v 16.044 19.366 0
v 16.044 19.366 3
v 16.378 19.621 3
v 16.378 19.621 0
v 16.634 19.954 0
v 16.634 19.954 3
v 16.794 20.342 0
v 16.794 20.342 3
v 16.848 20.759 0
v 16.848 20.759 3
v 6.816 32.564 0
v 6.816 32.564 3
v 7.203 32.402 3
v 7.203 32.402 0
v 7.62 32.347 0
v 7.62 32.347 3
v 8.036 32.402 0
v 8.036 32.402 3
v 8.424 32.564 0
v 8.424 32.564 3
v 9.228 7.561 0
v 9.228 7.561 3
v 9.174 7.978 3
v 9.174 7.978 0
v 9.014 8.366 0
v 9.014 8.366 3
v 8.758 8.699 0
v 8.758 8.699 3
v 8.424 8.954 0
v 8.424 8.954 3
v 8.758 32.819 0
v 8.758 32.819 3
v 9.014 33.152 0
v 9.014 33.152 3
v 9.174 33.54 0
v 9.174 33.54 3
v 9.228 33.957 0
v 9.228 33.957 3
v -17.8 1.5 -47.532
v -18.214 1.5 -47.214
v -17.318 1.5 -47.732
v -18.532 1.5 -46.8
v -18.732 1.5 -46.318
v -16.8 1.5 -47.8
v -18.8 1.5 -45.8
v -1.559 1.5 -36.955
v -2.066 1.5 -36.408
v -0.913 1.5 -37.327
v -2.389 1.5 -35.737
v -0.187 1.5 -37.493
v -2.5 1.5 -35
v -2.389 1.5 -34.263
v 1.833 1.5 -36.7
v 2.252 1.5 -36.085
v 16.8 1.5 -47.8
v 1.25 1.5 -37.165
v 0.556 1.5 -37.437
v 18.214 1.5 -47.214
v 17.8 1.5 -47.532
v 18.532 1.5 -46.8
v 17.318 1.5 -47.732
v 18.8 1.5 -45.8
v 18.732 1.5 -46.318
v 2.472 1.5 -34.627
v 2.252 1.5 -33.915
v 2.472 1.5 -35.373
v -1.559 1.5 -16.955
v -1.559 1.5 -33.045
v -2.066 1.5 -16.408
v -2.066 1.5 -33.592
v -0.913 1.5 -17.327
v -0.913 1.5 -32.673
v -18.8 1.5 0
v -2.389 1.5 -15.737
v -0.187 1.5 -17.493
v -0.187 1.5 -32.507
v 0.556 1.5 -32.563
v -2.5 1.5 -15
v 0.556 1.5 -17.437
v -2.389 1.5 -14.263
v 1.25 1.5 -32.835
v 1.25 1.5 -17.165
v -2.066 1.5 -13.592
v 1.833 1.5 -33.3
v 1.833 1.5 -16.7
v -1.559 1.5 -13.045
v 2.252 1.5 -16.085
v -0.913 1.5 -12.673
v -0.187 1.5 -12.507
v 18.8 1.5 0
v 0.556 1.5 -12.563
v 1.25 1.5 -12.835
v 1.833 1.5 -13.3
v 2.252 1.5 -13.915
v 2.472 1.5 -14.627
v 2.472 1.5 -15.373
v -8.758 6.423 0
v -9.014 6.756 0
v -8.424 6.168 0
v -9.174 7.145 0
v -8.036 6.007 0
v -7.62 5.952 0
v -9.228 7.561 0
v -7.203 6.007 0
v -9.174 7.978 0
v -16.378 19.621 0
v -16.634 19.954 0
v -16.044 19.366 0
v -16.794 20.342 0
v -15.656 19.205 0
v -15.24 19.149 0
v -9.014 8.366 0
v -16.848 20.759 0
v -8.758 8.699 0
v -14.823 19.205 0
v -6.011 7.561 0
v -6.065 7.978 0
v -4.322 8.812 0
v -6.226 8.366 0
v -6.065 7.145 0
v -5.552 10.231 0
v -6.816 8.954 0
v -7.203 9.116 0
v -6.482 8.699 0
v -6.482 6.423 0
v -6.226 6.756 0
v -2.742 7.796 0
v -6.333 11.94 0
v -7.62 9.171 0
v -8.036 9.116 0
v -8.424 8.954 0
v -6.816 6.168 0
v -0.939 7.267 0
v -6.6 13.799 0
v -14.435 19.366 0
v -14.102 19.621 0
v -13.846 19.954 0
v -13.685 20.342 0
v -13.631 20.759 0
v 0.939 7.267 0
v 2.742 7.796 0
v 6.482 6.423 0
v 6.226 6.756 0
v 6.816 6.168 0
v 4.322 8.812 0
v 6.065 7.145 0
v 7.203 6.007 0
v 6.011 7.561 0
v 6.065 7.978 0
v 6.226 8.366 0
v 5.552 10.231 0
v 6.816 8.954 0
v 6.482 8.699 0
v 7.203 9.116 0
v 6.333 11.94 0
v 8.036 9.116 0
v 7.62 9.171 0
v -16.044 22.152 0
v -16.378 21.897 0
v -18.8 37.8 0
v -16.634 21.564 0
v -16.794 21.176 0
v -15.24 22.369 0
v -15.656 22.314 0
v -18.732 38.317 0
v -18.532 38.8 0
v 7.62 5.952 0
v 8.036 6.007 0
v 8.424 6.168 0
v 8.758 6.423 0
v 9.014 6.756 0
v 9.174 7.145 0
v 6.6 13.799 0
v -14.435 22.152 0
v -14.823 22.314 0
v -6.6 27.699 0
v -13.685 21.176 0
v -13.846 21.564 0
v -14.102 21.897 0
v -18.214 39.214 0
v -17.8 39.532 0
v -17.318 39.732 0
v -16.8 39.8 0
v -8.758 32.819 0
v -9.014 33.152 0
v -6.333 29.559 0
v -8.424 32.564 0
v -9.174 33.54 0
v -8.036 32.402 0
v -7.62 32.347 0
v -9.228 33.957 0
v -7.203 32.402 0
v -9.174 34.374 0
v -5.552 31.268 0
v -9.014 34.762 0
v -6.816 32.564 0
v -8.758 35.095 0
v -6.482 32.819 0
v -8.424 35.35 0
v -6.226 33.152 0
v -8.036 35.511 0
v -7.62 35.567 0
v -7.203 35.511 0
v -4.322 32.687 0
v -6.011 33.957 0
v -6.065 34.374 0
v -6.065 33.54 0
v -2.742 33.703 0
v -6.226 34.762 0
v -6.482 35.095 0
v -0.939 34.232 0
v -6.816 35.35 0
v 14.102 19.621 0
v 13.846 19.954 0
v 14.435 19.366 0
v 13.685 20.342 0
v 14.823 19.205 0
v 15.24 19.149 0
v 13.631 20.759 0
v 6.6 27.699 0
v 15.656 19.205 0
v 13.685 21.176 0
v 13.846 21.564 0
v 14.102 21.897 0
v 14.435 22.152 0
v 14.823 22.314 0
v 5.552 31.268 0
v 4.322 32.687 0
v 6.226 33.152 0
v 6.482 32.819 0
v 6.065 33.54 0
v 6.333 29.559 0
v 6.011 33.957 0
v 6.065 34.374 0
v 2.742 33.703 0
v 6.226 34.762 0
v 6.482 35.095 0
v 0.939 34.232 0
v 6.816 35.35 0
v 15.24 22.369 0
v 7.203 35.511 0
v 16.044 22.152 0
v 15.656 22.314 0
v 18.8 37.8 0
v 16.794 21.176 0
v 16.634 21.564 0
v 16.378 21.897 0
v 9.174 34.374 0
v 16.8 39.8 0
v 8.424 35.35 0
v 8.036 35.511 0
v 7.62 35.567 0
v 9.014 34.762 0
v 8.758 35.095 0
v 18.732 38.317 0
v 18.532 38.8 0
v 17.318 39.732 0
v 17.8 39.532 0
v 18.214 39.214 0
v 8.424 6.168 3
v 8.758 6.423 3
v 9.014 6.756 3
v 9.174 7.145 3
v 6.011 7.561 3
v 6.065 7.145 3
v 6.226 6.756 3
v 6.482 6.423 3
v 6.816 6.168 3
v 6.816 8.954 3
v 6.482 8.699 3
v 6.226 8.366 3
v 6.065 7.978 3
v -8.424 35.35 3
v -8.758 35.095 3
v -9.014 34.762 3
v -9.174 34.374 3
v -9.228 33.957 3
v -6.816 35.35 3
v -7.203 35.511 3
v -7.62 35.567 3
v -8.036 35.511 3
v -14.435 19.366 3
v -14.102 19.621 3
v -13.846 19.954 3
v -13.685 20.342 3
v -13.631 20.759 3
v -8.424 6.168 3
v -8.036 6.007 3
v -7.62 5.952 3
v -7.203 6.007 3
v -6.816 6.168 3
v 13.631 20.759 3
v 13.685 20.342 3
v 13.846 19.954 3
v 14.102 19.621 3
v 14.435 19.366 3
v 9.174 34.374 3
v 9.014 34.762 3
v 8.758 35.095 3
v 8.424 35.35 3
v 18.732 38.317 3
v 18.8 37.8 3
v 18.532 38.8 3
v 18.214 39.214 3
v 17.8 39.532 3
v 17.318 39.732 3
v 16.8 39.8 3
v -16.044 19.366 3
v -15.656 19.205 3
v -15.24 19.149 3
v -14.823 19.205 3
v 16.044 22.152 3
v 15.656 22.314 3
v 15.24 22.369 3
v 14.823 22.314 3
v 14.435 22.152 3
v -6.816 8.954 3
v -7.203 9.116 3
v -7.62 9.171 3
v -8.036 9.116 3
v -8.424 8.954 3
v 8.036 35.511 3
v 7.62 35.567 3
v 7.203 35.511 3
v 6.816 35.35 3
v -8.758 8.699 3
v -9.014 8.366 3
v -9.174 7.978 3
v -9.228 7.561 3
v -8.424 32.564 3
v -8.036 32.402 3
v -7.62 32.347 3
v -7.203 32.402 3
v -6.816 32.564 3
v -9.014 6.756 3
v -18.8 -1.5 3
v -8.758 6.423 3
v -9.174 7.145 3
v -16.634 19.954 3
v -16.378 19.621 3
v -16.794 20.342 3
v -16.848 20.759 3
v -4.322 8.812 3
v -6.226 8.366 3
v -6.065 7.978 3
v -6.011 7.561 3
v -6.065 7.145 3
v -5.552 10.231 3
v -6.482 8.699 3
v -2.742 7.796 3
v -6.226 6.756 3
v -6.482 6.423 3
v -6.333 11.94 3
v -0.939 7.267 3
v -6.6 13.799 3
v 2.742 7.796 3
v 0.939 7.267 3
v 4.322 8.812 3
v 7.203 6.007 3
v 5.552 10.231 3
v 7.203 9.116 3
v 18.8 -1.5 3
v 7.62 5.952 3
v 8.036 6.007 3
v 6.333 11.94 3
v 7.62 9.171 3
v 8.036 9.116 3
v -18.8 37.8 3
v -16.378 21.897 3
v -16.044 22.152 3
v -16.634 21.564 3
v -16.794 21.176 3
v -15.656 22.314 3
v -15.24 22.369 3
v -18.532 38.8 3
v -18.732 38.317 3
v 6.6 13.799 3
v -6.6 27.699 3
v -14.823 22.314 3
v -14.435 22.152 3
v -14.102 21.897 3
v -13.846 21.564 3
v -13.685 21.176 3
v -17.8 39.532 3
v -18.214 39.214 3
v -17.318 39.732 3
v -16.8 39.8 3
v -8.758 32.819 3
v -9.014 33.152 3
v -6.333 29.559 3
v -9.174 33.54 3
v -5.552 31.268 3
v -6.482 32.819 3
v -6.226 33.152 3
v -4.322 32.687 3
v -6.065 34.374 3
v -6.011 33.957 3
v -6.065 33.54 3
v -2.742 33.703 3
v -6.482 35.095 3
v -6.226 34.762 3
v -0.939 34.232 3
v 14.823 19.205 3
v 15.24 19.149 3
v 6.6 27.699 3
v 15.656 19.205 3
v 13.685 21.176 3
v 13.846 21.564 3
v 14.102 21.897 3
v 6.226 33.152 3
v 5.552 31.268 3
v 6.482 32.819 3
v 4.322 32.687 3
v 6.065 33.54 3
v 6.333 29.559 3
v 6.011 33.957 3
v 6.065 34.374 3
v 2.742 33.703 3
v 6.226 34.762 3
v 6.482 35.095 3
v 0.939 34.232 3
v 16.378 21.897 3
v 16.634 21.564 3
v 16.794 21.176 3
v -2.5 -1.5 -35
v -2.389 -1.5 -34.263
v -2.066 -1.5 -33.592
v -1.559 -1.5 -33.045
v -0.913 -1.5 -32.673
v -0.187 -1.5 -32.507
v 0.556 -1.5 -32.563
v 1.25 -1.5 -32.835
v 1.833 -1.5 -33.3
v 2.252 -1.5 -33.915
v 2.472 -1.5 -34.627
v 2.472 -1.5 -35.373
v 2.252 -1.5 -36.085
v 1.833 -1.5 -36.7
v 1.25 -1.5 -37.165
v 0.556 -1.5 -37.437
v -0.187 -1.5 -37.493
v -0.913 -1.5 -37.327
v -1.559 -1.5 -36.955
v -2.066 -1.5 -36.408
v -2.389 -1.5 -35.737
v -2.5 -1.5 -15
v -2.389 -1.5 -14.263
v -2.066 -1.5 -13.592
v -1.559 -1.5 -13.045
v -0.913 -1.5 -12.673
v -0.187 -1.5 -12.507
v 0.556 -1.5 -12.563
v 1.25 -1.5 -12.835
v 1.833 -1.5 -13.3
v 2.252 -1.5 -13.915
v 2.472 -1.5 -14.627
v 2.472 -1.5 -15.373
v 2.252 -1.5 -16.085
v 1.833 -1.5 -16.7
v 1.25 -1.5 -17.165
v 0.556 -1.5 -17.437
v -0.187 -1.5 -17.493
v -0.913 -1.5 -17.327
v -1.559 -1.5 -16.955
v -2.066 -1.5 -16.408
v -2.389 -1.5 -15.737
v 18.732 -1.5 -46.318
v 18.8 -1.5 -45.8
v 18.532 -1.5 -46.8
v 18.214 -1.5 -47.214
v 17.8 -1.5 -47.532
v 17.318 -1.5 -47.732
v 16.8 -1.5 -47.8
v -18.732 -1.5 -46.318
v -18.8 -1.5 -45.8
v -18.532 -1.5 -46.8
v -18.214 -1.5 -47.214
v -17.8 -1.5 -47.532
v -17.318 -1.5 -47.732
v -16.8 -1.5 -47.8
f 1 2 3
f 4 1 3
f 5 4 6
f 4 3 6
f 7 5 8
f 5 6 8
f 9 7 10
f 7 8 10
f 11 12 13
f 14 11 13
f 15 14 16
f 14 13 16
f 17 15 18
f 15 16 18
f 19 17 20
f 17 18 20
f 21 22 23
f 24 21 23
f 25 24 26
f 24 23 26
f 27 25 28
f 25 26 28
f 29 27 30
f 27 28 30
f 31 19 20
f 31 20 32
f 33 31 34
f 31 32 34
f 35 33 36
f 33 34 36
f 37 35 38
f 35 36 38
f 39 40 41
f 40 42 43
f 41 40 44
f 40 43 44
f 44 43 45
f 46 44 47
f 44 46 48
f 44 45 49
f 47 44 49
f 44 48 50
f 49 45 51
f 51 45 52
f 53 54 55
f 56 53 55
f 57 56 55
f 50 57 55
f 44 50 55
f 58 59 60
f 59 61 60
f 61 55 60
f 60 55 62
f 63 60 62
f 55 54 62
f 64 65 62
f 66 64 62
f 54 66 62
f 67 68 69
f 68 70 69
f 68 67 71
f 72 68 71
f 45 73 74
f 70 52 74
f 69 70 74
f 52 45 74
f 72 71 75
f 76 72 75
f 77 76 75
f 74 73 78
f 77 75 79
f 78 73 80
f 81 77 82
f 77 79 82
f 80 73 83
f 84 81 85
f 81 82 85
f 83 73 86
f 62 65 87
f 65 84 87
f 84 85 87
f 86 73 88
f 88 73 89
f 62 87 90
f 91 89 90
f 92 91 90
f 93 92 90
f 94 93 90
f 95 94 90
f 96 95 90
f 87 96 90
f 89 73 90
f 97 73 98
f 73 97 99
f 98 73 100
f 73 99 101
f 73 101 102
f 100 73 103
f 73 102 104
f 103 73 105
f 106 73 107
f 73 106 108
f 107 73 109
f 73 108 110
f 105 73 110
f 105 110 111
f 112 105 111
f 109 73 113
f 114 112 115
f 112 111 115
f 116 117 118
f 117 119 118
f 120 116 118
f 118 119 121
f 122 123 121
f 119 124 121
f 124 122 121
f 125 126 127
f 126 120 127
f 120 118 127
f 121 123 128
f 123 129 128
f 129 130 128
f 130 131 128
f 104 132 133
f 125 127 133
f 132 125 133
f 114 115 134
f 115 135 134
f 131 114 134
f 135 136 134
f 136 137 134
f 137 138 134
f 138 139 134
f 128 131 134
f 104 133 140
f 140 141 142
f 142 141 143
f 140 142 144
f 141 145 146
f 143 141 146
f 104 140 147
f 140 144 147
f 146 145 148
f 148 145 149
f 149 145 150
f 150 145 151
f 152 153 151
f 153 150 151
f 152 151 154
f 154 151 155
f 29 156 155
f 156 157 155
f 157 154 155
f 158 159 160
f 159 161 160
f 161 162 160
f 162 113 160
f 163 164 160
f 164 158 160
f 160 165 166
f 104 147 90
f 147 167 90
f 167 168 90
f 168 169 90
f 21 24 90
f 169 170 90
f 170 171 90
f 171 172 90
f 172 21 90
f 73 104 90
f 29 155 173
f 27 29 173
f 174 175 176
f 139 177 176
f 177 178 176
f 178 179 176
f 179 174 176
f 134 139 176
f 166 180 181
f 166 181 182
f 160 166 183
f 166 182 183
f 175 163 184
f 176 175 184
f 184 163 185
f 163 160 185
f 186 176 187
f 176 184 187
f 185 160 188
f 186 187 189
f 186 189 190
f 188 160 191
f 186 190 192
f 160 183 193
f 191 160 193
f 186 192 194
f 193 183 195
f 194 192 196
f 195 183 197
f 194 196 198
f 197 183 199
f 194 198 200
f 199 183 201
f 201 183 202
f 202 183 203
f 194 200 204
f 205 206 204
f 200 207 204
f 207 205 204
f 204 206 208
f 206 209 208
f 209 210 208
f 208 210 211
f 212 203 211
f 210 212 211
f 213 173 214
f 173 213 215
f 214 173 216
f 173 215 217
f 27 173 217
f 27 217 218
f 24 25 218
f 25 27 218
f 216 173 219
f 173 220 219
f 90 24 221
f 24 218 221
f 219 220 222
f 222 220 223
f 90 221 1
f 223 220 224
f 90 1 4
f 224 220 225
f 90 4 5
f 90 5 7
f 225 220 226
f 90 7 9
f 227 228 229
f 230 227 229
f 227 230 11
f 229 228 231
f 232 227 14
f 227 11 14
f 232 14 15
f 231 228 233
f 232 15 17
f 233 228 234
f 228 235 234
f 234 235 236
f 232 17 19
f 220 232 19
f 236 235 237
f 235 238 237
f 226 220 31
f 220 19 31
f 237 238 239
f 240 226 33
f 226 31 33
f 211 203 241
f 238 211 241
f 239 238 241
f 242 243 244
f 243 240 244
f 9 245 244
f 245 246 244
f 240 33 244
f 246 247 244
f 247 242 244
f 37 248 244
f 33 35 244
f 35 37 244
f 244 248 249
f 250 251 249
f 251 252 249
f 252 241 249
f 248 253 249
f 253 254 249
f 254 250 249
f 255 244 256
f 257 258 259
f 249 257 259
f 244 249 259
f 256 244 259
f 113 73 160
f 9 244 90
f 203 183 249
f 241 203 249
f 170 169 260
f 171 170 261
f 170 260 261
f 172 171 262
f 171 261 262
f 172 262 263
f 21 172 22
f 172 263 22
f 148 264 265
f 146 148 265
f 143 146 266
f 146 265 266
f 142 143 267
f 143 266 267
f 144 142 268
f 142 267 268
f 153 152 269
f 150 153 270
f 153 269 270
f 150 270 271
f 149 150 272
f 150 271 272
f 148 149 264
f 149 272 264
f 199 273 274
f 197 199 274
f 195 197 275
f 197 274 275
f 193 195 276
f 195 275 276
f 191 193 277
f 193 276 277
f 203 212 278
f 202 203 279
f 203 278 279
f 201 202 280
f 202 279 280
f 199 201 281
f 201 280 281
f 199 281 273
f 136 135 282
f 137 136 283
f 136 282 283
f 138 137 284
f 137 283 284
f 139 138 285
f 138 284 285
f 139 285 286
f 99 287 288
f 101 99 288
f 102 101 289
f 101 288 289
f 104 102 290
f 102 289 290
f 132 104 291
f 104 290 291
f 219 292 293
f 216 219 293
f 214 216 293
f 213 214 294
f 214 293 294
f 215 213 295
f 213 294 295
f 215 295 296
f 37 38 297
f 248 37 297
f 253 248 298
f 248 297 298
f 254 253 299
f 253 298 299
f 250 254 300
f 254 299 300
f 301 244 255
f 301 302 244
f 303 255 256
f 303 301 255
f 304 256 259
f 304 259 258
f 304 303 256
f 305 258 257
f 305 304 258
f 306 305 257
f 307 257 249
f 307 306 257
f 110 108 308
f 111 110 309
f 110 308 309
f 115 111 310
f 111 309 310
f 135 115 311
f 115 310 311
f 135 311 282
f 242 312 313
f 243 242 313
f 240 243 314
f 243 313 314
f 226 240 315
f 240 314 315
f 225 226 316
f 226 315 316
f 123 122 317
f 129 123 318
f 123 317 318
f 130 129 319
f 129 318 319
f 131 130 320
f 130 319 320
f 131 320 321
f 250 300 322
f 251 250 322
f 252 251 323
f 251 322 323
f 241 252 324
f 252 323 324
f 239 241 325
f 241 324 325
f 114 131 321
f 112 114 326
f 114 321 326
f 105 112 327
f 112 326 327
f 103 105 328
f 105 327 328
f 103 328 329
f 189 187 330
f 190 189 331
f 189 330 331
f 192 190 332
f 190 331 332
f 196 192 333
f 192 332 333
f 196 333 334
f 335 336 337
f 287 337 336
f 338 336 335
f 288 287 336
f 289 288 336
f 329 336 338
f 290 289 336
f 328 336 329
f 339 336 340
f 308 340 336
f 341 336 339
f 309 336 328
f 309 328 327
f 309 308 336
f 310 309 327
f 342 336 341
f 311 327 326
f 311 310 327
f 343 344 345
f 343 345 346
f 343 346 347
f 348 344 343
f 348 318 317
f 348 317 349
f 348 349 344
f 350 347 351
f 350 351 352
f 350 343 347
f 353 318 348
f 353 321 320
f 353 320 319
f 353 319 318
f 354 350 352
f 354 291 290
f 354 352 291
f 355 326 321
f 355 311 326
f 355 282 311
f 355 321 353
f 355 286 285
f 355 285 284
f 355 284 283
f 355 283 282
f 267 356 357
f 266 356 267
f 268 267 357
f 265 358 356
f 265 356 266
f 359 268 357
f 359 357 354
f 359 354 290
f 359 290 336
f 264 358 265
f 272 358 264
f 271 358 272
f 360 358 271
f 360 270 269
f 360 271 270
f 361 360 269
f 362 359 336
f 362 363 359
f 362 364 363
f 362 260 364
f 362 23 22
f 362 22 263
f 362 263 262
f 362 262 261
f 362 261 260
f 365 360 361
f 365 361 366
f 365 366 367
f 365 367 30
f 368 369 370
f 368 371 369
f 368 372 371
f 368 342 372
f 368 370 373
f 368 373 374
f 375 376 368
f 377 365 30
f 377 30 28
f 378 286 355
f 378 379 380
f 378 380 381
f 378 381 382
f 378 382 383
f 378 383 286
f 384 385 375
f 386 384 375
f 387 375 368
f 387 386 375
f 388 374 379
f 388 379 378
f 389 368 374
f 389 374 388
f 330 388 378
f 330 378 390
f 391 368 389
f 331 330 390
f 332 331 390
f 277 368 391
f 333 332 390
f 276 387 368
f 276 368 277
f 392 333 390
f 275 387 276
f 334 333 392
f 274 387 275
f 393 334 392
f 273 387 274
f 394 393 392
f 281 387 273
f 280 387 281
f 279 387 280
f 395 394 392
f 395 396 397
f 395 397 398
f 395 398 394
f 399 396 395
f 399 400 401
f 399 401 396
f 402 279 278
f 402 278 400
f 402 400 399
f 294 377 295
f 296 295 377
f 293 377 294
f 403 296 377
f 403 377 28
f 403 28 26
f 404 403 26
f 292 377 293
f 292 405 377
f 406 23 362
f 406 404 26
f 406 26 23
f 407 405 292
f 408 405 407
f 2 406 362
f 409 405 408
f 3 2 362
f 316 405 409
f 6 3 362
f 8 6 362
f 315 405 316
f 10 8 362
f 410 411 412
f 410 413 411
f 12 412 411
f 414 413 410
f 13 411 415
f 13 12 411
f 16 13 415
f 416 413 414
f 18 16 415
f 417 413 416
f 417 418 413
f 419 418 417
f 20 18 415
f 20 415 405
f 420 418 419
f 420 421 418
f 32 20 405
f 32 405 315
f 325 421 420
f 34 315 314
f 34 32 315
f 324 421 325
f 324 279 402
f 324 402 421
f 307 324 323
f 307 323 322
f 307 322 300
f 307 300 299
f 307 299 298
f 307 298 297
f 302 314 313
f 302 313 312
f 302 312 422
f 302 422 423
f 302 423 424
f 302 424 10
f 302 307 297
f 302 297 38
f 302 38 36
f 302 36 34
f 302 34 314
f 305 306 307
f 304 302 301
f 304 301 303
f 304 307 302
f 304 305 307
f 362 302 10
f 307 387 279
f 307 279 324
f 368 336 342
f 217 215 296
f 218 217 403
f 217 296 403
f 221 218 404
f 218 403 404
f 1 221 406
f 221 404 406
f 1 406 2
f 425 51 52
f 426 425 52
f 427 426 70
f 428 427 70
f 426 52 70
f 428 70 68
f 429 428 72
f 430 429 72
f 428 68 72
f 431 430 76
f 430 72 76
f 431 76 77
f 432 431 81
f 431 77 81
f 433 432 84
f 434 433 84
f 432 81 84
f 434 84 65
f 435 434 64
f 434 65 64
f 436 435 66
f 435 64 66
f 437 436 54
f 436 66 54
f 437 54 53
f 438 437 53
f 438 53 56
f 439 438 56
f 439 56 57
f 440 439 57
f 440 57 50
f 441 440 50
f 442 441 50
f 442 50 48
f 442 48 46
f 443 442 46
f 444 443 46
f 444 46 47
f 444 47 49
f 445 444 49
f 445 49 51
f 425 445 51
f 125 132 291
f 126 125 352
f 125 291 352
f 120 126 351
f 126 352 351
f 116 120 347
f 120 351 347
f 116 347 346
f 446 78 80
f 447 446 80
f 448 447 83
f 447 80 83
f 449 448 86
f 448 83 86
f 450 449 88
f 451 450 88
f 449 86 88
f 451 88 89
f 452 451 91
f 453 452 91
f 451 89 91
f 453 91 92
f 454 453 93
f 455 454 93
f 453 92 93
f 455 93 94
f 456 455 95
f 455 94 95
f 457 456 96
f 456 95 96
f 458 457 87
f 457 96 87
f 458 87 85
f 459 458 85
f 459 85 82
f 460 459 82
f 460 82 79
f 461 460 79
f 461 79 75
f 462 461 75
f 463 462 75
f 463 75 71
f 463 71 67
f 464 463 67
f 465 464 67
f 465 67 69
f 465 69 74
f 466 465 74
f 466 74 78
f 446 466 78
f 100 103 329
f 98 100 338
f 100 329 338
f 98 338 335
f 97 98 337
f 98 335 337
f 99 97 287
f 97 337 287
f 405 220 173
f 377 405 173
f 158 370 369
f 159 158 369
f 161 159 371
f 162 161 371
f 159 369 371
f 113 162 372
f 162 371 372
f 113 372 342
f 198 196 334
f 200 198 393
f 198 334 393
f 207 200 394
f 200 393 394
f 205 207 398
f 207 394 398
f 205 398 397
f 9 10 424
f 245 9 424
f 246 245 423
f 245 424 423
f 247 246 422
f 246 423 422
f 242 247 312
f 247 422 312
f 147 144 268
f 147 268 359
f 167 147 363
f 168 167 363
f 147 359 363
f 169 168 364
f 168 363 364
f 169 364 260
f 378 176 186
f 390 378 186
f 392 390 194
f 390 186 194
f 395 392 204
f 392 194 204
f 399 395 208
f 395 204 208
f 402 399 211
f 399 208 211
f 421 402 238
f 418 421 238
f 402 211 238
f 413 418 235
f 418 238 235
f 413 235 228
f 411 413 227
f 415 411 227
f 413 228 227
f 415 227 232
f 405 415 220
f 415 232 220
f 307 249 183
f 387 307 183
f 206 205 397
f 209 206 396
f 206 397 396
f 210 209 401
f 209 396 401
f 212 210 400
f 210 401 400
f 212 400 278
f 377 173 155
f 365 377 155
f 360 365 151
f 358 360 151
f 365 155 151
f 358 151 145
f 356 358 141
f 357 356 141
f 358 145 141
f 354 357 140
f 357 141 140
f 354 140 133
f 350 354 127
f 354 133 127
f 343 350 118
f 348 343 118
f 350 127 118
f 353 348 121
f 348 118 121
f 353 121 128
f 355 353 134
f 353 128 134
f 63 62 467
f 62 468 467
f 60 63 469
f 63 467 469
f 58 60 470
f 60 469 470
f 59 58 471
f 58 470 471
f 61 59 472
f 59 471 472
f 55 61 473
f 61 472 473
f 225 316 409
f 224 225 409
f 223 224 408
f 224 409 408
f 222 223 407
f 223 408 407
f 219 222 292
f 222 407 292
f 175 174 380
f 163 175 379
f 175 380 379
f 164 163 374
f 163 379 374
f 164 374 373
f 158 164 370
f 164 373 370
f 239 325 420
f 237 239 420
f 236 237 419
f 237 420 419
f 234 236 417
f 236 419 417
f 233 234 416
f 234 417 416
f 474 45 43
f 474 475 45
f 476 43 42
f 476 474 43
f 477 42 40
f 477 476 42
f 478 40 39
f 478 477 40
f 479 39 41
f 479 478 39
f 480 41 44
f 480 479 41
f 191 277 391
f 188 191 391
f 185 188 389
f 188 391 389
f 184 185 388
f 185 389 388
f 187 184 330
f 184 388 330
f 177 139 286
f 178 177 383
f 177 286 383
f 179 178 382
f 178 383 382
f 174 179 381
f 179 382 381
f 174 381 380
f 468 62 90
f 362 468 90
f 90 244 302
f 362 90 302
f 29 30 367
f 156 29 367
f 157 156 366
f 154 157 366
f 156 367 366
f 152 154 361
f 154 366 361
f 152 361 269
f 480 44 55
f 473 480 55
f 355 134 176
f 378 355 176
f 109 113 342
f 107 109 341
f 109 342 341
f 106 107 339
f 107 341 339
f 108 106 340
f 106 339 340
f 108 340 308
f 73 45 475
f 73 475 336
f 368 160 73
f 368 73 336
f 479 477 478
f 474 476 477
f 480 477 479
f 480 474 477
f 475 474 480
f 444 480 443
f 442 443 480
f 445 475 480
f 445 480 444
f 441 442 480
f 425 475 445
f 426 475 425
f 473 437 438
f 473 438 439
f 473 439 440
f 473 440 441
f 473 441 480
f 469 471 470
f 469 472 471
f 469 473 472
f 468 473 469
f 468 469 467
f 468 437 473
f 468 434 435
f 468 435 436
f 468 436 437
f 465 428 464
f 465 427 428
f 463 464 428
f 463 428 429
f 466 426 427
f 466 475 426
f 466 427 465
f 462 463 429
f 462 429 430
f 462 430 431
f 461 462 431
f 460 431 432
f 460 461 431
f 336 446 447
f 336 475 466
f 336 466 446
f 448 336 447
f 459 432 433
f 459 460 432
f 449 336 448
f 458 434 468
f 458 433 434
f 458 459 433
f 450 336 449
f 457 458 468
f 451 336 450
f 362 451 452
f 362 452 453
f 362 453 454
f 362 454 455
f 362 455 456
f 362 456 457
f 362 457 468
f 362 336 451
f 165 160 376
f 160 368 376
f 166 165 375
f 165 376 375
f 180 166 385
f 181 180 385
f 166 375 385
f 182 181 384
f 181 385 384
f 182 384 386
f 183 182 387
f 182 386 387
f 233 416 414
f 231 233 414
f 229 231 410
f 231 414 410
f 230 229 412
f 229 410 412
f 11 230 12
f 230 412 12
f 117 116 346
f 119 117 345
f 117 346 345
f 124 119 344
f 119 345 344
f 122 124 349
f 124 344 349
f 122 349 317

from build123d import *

# Parameters (mm, degrees)
BOSS_EXTRUDE1_DEPTH        = 3
BOSS_EXTRUDE2_DEPTH        = 1.5
BOSS_EXTRUDE2_DEPTH_BACK   = 1.5
SKETCH2_W                  = 37.6
SKETCH2_H                  = 50.8
FILLET2_R                  = 2
CUT_EXTRUDE2_REACH         = 69.217
SKETCH4_R                  = 1.6
CIRPATTERN1_COUNT          = 6
SZKIC1_R                   = 2.5
WYTNIJ_WYCI_GNI_CIE1_DEPTH = 10


with BuildPart() as part:
    # Sketch1 → Boss-Extrude1 (new body)
    with BuildSketch(Plane.XY):
        Polygon((-18.8, 0), (18.8, 0), (18.8, 22), (18.8, 39.799804834), (-18.8, 39.799804834), (-18.8, 22), align=None)
        with BuildLine():
            Line((-6.6, 13.799434154), (-6.6, 27.699434154))
            ThreePointArc((-6.6, 27.699434154), (0, 34.299458505), (6.6, 27.699434154))
            Line((6.6, 27.699434154), (6.6, 13.799434154))
            ThreePointArc((6.6, 13.799434154), (0, 7.199458505), (-6.6, 13.799434154))
        make_face(mode=Mode.SUBTRACT)
    extrude(amount=BOSS_EXTRUDE1_DEPTH)

    # Sketch2 → Boss-Extrude2 (add, two sides: drawn at the far end of the back side and taken through both)
    with BuildSketch(Plane.XZ.offset(-BOSS_EXTRUDE2_DEPTH_BACK)):
        with Locations((0, -22.4)):
            Rectangle(SKETCH2_W, SKETCH2_H)
    extrude(amount=BOSS_EXTRUDE2_DEPTH + BOSS_EXTRUDE2_DEPTH_BACK)

    # Fillet2
    fillet2_edges = [part.edges().sort_by_distance(p)[0] for p in [
        (-18.8, 39.799804834, 1.5),
        (18.8, 39.799804834, 1.5),
        (-18.8, 0, -47.8),
        (18.8, 0, -47.8),
    ]]
    fillet(fillet2_edges, radius=FILLET2_R)

    # Sketch4 → Cut-Extrude2 (cut, up to next)
    with BuildSketch(Plane.XY.offset(3), mode=Mode.PRIVATE) as cut_extrude2_sk1:
        with Locations((7.619805215, 33.947348281)):
            Circle(SKETCH4_R)
    cut_extrude2_tool1 = extrude(cut_extrude2_sk1.sketch, amount=-CUT_EXTRUDE2_REACH, mode=Mode.PRIVATE) & part.part
    # Sketch4 → Cut-Extrude2 (cut, up to next)
    with BuildSketch(Plane.XY.offset(3), mode=Mode.PRIVATE) as cut_extrude2_sk2:
        with Locations((15.23961043, 20.749458505)):
            Circle(SKETCH4_R)
    cut_extrude2_tool2 = extrude(cut_extrude2_sk2.sketch, amount=-CUT_EXTRUDE2_REACH, mode=Mode.PRIVATE) & part.part
    # Sketch4 → Cut-Extrude2 (cut, up to next)
    with BuildSketch(Plane.XY.offset(3), mode=Mode.PRIVATE) as cut_extrude2_sk3:
        with Locations((7.619805215, 7.551568728)):
            Circle(SKETCH4_R)
    cut_extrude2_tool3 = extrude(cut_extrude2_sk3.sketch, amount=-CUT_EXTRUDE2_REACH, mode=Mode.PRIVATE) & part.part
    # Sketch4 → Cut-Extrude2 (cut, up to next)
    with BuildSketch(Plane.XY.offset(3), mode=Mode.PRIVATE) as cut_extrude2_sk4:
        with Locations((-7.619805215, 7.551568728)):
            Circle(SKETCH4_R)
    cut_extrude2_tool4 = extrude(cut_extrude2_sk4.sketch, amount=-CUT_EXTRUDE2_REACH, mode=Mode.PRIVATE) & part.part
    # Sketch4 → Cut-Extrude2 (cut, up to next)
    with BuildSketch(Plane.XY.offset(3), mode=Mode.PRIVATE) as cut_extrude2_sk5:
        with Locations((-15.23961043, 20.749458505)):
            Circle(SKETCH4_R)
    cut_extrude2_tool5 = extrude(cut_extrude2_sk5.sketch, amount=-CUT_EXTRUDE2_REACH, mode=Mode.PRIVATE) & part.part
    # Sketch4 → Cut-Extrude2 (cut, up to next)
    with BuildSketch(Plane.XY.offset(3), mode=Mode.PRIVATE) as cut_extrude2_sk6:
        with Locations((-7.619805215, 33.947348281)):
            Circle(SKETCH4_R)
    cut_extrude2_tool6 = extrude(cut_extrude2_sk6.sketch, amount=-CUT_EXTRUDE2_REACH, mode=Mode.PRIVATE) & part.part
    cut_extrude2_1 = cut_extrude2_tool1.solids().sort_by_distance((7.619805, 33.947348, 3))[0]
    add(cut_extrude2_1, mode=Mode.SUBTRACT)
    cut_extrude2_2 = cut_extrude2_tool2.solids().sort_by_distance((15.23961, 20.749459, 3))[0]
    add(cut_extrude2_2, mode=Mode.SUBTRACT)
    cut_extrude2_3 = cut_extrude2_tool3.solids().sort_by_distance((7.619805, 7.551569, 3))[0]
    add(cut_extrude2_3, mode=Mode.SUBTRACT)
    cut_extrude2_4 = cut_extrude2_tool4.solids().sort_by_distance((-7.619805, 7.551569, 3))[0]
    add(cut_extrude2_4, mode=Mode.SUBTRACT)
    cut_extrude2_5 = cut_extrude2_tool5.solids().sort_by_distance((-15.23961, 20.749459, 3))[0]
    add(cut_extrude2_5, mode=Mode.SUBTRACT)
    cut_extrude2_6 = cut_extrude2_tool6.solids().sort_by_distance((-7.619805, 33.947348, 3))[0]
    add(cut_extrude2_6, mode=Mode.SUBTRACT)
    cut_extrude2 = cut_extrude2_1 + cut_extrude2_2 + cut_extrude2_3 + cut_extrude2_4 + cut_extrude2_5 + cut_extrude2_6  # Cut-Extrude2 as one shape, for the pattern or mirror that repeats it

    # CirPattern1: Cut-Extrude2 ×6 about axis
    cirpattern1_axis = Axis((0, 20.759090909, 0), (0, 0, 1))
    for i in range(1, CIRPATTERN1_COUNT):
        add(cut_extrude2.rotate(cirpattern1_axis, i * 360 / CIRPATTERN1_COUNT), mode=Mode.SUBTRACT)

    # Szkic1 → Wytnij-wyciągnięcie1 (cut)
    with BuildSketch(Plane(origin=(0, 1.5, 0), x_dir=(1, 0, 0), z_dir=(0, 1, 0))):
        with Locations(Location((0, 15, 0), (0, 0, 180))):
            Circle(SZKIC1_R)
        with Locations(Location((0, 35, 0), (0, 0, 180))):
            Circle(SZKIC1_R)
    extrude(amount=-WYTNIJ_WYCI_GNI_CIE1_DEPTH, mode=Mode.SUBTRACT)


solid = part.part
